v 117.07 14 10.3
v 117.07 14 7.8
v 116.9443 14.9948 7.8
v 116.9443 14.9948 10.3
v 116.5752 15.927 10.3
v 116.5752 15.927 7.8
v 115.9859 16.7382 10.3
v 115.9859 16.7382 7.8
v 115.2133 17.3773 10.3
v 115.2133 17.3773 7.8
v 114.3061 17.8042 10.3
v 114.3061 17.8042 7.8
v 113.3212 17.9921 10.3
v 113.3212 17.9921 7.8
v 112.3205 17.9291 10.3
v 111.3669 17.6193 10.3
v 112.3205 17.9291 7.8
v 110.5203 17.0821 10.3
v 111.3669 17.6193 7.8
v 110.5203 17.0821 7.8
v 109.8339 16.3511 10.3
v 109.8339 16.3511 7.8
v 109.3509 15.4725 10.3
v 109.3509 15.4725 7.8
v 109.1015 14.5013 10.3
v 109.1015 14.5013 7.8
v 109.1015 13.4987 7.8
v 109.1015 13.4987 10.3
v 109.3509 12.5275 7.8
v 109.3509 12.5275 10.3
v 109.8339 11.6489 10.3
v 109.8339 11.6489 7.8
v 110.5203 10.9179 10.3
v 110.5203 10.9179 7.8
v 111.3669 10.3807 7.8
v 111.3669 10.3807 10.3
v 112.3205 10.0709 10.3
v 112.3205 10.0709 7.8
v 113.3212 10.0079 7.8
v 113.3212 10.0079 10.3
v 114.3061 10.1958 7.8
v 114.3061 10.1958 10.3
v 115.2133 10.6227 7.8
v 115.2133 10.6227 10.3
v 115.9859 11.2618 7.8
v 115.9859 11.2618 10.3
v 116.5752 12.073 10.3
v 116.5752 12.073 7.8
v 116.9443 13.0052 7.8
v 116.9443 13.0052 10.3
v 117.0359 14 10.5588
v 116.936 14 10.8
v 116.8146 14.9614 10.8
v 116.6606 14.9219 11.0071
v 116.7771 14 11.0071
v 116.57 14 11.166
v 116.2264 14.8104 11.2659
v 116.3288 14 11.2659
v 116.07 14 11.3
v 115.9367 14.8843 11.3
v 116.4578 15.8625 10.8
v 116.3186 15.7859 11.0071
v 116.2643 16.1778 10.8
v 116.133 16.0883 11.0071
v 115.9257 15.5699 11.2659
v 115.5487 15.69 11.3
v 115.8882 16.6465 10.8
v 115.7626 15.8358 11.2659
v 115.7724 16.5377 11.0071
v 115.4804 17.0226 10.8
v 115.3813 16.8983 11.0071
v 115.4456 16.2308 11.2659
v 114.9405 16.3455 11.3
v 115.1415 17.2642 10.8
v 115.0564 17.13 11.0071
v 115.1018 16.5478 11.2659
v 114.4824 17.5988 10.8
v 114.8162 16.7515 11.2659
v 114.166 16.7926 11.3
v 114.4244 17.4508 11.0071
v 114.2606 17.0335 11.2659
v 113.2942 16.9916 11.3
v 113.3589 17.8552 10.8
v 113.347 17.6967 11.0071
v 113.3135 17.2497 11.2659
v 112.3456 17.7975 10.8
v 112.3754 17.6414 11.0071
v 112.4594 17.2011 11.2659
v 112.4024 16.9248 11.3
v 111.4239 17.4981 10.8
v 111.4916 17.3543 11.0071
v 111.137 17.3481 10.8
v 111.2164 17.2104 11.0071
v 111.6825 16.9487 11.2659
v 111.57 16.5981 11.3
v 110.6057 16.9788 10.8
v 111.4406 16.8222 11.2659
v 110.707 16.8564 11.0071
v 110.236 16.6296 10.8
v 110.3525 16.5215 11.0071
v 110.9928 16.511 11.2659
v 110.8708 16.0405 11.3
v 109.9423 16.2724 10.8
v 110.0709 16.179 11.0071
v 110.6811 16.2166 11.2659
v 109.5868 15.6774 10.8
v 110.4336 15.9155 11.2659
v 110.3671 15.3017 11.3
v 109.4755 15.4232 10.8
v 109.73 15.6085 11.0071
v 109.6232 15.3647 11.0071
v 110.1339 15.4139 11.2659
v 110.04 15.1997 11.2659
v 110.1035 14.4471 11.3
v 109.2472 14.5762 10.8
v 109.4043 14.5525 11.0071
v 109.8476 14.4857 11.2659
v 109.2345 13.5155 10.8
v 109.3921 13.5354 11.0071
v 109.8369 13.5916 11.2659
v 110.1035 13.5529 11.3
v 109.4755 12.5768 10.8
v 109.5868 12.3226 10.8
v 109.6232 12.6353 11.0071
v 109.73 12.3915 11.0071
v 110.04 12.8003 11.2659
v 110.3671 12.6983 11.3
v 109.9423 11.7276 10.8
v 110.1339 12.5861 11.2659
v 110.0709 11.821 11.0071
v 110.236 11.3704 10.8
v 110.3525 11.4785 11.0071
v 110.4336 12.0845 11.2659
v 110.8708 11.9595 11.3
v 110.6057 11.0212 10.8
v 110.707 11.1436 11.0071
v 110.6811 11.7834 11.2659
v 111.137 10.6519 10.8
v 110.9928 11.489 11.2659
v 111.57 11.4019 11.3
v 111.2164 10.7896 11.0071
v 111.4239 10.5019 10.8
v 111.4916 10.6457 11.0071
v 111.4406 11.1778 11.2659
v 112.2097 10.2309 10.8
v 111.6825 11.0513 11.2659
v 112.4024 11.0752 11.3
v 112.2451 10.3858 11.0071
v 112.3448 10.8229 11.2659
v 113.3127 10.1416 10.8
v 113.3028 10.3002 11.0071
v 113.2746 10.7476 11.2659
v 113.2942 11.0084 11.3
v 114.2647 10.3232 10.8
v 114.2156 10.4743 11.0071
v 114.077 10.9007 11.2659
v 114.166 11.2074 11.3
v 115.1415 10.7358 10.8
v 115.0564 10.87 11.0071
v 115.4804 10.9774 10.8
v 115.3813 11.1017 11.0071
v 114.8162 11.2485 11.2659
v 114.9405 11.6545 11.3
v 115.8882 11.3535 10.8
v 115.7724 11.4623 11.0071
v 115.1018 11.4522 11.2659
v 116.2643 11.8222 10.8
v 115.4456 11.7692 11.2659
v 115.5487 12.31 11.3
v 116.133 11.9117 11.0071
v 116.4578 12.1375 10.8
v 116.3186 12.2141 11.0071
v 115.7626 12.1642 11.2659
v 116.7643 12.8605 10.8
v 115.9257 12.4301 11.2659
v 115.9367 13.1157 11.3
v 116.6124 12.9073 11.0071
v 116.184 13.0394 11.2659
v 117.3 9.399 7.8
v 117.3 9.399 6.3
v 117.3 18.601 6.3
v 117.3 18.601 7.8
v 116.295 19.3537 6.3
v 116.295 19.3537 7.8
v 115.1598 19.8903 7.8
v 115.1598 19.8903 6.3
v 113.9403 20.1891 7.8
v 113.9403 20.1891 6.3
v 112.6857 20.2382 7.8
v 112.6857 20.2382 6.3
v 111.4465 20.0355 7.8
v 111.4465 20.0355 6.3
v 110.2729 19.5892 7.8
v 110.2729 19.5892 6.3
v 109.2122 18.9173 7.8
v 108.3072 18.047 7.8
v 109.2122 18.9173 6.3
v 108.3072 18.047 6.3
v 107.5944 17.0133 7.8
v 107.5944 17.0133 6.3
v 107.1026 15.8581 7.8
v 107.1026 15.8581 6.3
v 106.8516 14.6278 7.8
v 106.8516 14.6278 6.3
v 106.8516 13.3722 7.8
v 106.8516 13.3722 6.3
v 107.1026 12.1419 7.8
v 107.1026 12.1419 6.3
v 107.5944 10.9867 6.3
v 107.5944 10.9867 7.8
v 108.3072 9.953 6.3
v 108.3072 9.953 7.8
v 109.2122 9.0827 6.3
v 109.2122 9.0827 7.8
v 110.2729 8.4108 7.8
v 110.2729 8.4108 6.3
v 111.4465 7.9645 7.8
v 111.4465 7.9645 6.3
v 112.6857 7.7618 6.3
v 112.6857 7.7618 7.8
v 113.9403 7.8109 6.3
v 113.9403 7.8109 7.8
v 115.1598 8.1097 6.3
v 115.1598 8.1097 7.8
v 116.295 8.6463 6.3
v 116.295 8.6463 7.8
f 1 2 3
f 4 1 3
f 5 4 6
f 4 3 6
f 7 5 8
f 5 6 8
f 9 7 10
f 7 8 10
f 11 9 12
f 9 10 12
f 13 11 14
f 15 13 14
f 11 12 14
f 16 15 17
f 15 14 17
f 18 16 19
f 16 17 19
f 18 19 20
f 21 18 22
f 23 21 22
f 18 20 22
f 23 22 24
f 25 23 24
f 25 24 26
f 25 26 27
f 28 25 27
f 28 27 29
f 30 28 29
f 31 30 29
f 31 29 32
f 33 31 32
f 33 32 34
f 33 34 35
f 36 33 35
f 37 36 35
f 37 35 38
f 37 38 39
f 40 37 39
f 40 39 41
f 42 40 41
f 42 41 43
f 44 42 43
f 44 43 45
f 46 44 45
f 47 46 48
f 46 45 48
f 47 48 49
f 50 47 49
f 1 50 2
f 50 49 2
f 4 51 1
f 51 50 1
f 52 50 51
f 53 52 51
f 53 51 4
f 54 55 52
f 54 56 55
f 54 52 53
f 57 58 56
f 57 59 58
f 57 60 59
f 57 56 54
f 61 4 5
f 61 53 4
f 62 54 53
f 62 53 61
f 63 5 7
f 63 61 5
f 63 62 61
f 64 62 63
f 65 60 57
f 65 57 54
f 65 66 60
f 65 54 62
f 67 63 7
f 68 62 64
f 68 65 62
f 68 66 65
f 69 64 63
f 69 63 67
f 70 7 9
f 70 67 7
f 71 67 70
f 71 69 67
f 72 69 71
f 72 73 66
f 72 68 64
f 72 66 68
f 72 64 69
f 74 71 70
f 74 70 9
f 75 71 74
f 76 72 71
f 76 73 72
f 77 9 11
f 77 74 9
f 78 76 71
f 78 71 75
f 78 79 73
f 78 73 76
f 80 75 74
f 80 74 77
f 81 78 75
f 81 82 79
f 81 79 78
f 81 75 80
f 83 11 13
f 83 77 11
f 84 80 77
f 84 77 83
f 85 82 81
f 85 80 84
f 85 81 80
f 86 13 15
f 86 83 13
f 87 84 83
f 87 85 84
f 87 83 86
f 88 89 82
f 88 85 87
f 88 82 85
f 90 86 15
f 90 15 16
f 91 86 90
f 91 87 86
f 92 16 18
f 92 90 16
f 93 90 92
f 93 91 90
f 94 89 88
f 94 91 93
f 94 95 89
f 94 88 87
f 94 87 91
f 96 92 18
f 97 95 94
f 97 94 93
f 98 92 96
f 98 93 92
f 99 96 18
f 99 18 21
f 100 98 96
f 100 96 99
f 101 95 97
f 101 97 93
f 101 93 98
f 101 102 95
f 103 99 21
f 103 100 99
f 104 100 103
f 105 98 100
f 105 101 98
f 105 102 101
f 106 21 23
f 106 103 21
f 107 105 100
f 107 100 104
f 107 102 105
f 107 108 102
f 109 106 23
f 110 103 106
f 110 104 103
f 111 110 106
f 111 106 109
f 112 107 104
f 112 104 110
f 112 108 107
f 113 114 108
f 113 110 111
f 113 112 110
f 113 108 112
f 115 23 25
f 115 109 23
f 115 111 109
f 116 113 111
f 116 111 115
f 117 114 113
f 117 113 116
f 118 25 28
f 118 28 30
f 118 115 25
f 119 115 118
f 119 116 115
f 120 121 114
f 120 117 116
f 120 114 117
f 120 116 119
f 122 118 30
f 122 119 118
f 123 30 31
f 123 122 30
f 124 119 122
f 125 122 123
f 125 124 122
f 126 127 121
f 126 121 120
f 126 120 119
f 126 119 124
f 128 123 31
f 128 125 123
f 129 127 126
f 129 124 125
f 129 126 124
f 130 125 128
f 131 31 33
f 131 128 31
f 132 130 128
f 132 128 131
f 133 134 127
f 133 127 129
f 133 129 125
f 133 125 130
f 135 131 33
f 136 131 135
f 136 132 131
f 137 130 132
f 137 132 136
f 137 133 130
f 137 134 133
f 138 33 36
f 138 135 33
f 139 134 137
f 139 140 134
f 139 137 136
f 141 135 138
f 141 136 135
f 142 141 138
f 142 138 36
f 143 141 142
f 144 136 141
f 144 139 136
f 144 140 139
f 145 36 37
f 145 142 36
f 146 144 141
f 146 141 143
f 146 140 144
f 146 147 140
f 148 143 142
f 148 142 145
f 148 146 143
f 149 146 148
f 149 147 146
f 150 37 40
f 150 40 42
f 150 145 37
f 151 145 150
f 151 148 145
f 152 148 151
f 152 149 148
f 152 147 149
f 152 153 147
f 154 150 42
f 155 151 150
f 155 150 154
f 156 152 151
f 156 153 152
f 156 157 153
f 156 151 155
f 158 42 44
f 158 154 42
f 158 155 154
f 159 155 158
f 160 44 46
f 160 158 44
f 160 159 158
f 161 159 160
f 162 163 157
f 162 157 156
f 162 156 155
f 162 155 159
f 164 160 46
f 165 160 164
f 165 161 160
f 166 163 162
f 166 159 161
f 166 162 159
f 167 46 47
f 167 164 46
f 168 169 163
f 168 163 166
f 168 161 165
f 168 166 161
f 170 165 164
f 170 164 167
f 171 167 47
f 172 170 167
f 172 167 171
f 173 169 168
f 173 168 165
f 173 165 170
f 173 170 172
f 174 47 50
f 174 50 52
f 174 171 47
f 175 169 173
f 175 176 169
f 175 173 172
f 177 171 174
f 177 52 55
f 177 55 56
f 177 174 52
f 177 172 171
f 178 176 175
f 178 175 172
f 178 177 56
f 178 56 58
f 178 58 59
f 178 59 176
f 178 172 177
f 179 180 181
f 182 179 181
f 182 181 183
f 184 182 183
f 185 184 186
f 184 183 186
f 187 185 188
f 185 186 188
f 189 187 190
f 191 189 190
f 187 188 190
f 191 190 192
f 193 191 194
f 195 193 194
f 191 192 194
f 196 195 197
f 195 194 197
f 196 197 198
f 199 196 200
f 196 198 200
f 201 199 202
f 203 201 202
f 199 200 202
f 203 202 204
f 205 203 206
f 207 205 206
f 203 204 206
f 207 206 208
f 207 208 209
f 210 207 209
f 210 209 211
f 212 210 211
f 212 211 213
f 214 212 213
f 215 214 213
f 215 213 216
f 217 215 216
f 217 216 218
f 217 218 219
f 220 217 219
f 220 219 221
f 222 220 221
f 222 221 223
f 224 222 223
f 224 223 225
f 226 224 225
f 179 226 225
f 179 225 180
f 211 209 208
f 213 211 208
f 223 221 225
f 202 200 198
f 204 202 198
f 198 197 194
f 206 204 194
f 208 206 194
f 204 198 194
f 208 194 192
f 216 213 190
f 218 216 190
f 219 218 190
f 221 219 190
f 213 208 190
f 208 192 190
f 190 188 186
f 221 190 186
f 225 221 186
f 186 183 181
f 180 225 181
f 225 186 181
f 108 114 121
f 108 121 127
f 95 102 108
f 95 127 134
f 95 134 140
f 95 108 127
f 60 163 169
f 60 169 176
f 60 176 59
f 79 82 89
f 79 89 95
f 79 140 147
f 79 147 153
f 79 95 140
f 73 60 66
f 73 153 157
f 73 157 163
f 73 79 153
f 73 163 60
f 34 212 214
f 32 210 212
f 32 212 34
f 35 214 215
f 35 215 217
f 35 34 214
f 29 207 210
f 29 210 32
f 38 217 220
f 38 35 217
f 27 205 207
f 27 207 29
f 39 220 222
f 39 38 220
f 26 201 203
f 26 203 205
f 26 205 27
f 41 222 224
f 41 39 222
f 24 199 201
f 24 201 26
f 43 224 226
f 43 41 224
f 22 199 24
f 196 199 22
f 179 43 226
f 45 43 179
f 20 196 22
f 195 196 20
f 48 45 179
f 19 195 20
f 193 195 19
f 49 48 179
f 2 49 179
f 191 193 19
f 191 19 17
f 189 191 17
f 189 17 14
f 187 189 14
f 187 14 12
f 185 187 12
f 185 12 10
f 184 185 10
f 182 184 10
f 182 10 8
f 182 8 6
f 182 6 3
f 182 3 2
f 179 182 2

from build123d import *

# Parameters (mm, degrees)
BOX116_W          = 10
BOX116_H          = 10
BOX116_DEPTH      = 10
CYLINDER019_R     = 4
CYLINDER019_DEPTH = 5
FILLET003_R       = 1
CYLINDER018_R     = 6.25
CYLINDER018_DEPTH = 1.5


with BuildPart() as cube106:
    # Box116 → Box116 (new body)
    with BuildSketch(Plane(origin=(117.3, 9, 0), x_dir=(1, 0, 0), z_dir=(0, 0, 1))):
        with Locations((5, 5)):
            Rectangle(BOX116_W, BOX116_H)
    extrude(amount=BOX116_DEPTH)


with BuildPart() as btn2_top:
    # Cylinder019 → Cylinder019 (new body)
    with BuildSketch(Plane(origin=(131.07, 14, 6.3), x_dir=(1, 0, 0), z_dir=(0, 0, 1))):
        Circle(CYLINDER019_R)
    extrude(amount=CYLINDER019_DEPTH)

    # Fillet003
    fillet003_edges = [btn2_top.edges().sort_by_distance(p)[0] for p in [
        (127.07, 14, 11.3),
    ]]
    fillet(fillet003_edges, radius=FILLET003_R)


with BuildPart() as cut072:
    # Cylinder018 → Cylinder018 (new body)
    with BuildSketch(Plane(origin=(131.07, 14, 6.3), x_dir=(1, 0, 0), z_dir=(0, 0, 1))):
        Circle(CYLINDER018_R)
    extrude(amount=CYLINDER018_DEPTH)

    # Fusion014: union Btn2_Top
    add(btn2_top.part)


with BuildPart() as cut072_1:
    # Fusion014 placement: moved
    add(cut072.part.moved(Location((-18, 0, 0))))

    # Cut072: cut Cube106
    add(cube106.part, mode=Mode.SUBTRACT)


solid = cut072_1.part
